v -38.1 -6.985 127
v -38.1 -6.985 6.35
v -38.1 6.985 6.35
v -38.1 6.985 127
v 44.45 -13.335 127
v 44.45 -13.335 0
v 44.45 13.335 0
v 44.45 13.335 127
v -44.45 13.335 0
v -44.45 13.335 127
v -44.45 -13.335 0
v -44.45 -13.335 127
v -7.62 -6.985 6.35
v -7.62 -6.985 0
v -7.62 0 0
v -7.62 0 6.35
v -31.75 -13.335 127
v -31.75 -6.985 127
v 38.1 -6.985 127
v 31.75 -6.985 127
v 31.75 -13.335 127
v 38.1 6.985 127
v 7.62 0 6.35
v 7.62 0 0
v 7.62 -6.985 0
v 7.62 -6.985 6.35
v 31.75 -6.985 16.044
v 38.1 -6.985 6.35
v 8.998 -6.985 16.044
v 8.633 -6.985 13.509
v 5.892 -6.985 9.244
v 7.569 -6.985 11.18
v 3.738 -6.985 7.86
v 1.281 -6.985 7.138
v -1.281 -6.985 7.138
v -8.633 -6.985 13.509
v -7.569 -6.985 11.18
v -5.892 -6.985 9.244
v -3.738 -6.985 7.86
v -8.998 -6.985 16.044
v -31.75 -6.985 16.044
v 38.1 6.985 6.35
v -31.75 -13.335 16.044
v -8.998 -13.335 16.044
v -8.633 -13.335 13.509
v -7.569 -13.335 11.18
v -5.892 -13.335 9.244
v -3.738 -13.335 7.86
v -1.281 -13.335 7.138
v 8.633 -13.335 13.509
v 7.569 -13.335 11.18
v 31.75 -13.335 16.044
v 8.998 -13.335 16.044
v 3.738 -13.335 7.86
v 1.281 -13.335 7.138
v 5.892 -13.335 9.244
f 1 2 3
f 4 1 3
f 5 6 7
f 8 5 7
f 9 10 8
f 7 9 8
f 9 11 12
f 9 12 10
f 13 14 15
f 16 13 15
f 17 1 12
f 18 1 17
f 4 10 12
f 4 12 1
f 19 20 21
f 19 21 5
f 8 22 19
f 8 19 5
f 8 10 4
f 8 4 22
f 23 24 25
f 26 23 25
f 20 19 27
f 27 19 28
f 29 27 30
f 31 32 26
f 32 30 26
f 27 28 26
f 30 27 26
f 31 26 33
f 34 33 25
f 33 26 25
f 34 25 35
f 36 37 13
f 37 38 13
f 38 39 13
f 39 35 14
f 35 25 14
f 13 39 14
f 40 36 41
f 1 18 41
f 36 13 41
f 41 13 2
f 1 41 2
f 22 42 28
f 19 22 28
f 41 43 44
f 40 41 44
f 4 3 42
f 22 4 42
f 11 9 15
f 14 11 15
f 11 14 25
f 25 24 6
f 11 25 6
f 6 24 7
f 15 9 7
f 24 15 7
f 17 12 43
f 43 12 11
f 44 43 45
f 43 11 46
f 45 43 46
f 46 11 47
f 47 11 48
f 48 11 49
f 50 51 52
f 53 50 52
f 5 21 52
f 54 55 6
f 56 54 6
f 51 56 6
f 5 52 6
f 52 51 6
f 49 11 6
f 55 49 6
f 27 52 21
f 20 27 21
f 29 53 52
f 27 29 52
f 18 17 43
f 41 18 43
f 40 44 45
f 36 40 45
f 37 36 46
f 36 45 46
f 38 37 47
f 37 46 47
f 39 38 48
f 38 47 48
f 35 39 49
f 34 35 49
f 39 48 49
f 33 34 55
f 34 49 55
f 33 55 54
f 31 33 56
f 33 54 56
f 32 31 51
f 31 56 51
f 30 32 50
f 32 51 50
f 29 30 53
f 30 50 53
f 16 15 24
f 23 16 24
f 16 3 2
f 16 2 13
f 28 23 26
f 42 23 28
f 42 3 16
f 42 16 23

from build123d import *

# Parameters (mm, degrees)
F1_DEPTH = 6.35
F0_W     = 88.9
F0_H     = 26.67
F2_DEPTH = 127
F4_DEPTH = 6.35


with BuildPart() as f1:
    # F0 (on Top) → F1 (new body)
    with BuildSketch(Plane.XY):
        Polygon((38.1, -6.985), (38.1, 6.985), (-38.1, 6.985), (-38.1, -6.985), (-7.62, -6.985), (-7.62, 0), (7.62, 0), (7.62, -6.985), align=None)
    extrude(amount=F1_DEPTH)

    # F0 (on Top) → F2 (join)
    with BuildSketch(Plane.XY):
        Rectangle(F0_W, F0_H)
        Polygon((-38.1, 6.985), (38.1, 6.985), (38.1, -6.985), (7.62, -6.985), (-7.62, -6.985), (-38.1, -6.985), align=None, mode=Mode.SUBTRACT)
    extrude(amount=F2_DEPTH)

    # F3 (on face) → F4 (cut, through all)
    with BuildSketch(Plane.XZ.offset(13.335)):
        with BuildLine():
            Line((31.75, 127), (-31.75, 127))
            Line((-31.75, 127), (-31.75, 16.0443484783))
            Line((-31.75, 16.0443484783), (-8.9978614884, 16.0443484783))
            ThreePointArc((-8.9978614884, 16.0443484783), (0, 25.0422099667), (8.9978614884, 16.0443484783))
            Line((8.9978614884, 16.0443484783), (31.75, 16.0443484783))
            Line((31.75, 16.0443484783), (31.75, 127))
        make_face()
        with BuildLine():
            ThreePointArc((8.9978614884, 16.0443484783), (0, 25.0422099667), (-8.9978614884, 16.0443484783))
            Line((-8.9978614884, 16.0443484783), (8.9978614884, 16.0443484783))
        make_face()
        with BuildLine():
            Line((8.9978614884, 16.0443484783), (-8.9978614884, 16.0443484783))
            ThreePointArc((-8.9978614884, 16.0443484783), (0, 7.0464869899), (8.9978614884, 16.0443484783))
        make_face()
    extrude(amount=-F4_DEPTH, mode=Mode.SUBTRACT)


solid = f1.part
